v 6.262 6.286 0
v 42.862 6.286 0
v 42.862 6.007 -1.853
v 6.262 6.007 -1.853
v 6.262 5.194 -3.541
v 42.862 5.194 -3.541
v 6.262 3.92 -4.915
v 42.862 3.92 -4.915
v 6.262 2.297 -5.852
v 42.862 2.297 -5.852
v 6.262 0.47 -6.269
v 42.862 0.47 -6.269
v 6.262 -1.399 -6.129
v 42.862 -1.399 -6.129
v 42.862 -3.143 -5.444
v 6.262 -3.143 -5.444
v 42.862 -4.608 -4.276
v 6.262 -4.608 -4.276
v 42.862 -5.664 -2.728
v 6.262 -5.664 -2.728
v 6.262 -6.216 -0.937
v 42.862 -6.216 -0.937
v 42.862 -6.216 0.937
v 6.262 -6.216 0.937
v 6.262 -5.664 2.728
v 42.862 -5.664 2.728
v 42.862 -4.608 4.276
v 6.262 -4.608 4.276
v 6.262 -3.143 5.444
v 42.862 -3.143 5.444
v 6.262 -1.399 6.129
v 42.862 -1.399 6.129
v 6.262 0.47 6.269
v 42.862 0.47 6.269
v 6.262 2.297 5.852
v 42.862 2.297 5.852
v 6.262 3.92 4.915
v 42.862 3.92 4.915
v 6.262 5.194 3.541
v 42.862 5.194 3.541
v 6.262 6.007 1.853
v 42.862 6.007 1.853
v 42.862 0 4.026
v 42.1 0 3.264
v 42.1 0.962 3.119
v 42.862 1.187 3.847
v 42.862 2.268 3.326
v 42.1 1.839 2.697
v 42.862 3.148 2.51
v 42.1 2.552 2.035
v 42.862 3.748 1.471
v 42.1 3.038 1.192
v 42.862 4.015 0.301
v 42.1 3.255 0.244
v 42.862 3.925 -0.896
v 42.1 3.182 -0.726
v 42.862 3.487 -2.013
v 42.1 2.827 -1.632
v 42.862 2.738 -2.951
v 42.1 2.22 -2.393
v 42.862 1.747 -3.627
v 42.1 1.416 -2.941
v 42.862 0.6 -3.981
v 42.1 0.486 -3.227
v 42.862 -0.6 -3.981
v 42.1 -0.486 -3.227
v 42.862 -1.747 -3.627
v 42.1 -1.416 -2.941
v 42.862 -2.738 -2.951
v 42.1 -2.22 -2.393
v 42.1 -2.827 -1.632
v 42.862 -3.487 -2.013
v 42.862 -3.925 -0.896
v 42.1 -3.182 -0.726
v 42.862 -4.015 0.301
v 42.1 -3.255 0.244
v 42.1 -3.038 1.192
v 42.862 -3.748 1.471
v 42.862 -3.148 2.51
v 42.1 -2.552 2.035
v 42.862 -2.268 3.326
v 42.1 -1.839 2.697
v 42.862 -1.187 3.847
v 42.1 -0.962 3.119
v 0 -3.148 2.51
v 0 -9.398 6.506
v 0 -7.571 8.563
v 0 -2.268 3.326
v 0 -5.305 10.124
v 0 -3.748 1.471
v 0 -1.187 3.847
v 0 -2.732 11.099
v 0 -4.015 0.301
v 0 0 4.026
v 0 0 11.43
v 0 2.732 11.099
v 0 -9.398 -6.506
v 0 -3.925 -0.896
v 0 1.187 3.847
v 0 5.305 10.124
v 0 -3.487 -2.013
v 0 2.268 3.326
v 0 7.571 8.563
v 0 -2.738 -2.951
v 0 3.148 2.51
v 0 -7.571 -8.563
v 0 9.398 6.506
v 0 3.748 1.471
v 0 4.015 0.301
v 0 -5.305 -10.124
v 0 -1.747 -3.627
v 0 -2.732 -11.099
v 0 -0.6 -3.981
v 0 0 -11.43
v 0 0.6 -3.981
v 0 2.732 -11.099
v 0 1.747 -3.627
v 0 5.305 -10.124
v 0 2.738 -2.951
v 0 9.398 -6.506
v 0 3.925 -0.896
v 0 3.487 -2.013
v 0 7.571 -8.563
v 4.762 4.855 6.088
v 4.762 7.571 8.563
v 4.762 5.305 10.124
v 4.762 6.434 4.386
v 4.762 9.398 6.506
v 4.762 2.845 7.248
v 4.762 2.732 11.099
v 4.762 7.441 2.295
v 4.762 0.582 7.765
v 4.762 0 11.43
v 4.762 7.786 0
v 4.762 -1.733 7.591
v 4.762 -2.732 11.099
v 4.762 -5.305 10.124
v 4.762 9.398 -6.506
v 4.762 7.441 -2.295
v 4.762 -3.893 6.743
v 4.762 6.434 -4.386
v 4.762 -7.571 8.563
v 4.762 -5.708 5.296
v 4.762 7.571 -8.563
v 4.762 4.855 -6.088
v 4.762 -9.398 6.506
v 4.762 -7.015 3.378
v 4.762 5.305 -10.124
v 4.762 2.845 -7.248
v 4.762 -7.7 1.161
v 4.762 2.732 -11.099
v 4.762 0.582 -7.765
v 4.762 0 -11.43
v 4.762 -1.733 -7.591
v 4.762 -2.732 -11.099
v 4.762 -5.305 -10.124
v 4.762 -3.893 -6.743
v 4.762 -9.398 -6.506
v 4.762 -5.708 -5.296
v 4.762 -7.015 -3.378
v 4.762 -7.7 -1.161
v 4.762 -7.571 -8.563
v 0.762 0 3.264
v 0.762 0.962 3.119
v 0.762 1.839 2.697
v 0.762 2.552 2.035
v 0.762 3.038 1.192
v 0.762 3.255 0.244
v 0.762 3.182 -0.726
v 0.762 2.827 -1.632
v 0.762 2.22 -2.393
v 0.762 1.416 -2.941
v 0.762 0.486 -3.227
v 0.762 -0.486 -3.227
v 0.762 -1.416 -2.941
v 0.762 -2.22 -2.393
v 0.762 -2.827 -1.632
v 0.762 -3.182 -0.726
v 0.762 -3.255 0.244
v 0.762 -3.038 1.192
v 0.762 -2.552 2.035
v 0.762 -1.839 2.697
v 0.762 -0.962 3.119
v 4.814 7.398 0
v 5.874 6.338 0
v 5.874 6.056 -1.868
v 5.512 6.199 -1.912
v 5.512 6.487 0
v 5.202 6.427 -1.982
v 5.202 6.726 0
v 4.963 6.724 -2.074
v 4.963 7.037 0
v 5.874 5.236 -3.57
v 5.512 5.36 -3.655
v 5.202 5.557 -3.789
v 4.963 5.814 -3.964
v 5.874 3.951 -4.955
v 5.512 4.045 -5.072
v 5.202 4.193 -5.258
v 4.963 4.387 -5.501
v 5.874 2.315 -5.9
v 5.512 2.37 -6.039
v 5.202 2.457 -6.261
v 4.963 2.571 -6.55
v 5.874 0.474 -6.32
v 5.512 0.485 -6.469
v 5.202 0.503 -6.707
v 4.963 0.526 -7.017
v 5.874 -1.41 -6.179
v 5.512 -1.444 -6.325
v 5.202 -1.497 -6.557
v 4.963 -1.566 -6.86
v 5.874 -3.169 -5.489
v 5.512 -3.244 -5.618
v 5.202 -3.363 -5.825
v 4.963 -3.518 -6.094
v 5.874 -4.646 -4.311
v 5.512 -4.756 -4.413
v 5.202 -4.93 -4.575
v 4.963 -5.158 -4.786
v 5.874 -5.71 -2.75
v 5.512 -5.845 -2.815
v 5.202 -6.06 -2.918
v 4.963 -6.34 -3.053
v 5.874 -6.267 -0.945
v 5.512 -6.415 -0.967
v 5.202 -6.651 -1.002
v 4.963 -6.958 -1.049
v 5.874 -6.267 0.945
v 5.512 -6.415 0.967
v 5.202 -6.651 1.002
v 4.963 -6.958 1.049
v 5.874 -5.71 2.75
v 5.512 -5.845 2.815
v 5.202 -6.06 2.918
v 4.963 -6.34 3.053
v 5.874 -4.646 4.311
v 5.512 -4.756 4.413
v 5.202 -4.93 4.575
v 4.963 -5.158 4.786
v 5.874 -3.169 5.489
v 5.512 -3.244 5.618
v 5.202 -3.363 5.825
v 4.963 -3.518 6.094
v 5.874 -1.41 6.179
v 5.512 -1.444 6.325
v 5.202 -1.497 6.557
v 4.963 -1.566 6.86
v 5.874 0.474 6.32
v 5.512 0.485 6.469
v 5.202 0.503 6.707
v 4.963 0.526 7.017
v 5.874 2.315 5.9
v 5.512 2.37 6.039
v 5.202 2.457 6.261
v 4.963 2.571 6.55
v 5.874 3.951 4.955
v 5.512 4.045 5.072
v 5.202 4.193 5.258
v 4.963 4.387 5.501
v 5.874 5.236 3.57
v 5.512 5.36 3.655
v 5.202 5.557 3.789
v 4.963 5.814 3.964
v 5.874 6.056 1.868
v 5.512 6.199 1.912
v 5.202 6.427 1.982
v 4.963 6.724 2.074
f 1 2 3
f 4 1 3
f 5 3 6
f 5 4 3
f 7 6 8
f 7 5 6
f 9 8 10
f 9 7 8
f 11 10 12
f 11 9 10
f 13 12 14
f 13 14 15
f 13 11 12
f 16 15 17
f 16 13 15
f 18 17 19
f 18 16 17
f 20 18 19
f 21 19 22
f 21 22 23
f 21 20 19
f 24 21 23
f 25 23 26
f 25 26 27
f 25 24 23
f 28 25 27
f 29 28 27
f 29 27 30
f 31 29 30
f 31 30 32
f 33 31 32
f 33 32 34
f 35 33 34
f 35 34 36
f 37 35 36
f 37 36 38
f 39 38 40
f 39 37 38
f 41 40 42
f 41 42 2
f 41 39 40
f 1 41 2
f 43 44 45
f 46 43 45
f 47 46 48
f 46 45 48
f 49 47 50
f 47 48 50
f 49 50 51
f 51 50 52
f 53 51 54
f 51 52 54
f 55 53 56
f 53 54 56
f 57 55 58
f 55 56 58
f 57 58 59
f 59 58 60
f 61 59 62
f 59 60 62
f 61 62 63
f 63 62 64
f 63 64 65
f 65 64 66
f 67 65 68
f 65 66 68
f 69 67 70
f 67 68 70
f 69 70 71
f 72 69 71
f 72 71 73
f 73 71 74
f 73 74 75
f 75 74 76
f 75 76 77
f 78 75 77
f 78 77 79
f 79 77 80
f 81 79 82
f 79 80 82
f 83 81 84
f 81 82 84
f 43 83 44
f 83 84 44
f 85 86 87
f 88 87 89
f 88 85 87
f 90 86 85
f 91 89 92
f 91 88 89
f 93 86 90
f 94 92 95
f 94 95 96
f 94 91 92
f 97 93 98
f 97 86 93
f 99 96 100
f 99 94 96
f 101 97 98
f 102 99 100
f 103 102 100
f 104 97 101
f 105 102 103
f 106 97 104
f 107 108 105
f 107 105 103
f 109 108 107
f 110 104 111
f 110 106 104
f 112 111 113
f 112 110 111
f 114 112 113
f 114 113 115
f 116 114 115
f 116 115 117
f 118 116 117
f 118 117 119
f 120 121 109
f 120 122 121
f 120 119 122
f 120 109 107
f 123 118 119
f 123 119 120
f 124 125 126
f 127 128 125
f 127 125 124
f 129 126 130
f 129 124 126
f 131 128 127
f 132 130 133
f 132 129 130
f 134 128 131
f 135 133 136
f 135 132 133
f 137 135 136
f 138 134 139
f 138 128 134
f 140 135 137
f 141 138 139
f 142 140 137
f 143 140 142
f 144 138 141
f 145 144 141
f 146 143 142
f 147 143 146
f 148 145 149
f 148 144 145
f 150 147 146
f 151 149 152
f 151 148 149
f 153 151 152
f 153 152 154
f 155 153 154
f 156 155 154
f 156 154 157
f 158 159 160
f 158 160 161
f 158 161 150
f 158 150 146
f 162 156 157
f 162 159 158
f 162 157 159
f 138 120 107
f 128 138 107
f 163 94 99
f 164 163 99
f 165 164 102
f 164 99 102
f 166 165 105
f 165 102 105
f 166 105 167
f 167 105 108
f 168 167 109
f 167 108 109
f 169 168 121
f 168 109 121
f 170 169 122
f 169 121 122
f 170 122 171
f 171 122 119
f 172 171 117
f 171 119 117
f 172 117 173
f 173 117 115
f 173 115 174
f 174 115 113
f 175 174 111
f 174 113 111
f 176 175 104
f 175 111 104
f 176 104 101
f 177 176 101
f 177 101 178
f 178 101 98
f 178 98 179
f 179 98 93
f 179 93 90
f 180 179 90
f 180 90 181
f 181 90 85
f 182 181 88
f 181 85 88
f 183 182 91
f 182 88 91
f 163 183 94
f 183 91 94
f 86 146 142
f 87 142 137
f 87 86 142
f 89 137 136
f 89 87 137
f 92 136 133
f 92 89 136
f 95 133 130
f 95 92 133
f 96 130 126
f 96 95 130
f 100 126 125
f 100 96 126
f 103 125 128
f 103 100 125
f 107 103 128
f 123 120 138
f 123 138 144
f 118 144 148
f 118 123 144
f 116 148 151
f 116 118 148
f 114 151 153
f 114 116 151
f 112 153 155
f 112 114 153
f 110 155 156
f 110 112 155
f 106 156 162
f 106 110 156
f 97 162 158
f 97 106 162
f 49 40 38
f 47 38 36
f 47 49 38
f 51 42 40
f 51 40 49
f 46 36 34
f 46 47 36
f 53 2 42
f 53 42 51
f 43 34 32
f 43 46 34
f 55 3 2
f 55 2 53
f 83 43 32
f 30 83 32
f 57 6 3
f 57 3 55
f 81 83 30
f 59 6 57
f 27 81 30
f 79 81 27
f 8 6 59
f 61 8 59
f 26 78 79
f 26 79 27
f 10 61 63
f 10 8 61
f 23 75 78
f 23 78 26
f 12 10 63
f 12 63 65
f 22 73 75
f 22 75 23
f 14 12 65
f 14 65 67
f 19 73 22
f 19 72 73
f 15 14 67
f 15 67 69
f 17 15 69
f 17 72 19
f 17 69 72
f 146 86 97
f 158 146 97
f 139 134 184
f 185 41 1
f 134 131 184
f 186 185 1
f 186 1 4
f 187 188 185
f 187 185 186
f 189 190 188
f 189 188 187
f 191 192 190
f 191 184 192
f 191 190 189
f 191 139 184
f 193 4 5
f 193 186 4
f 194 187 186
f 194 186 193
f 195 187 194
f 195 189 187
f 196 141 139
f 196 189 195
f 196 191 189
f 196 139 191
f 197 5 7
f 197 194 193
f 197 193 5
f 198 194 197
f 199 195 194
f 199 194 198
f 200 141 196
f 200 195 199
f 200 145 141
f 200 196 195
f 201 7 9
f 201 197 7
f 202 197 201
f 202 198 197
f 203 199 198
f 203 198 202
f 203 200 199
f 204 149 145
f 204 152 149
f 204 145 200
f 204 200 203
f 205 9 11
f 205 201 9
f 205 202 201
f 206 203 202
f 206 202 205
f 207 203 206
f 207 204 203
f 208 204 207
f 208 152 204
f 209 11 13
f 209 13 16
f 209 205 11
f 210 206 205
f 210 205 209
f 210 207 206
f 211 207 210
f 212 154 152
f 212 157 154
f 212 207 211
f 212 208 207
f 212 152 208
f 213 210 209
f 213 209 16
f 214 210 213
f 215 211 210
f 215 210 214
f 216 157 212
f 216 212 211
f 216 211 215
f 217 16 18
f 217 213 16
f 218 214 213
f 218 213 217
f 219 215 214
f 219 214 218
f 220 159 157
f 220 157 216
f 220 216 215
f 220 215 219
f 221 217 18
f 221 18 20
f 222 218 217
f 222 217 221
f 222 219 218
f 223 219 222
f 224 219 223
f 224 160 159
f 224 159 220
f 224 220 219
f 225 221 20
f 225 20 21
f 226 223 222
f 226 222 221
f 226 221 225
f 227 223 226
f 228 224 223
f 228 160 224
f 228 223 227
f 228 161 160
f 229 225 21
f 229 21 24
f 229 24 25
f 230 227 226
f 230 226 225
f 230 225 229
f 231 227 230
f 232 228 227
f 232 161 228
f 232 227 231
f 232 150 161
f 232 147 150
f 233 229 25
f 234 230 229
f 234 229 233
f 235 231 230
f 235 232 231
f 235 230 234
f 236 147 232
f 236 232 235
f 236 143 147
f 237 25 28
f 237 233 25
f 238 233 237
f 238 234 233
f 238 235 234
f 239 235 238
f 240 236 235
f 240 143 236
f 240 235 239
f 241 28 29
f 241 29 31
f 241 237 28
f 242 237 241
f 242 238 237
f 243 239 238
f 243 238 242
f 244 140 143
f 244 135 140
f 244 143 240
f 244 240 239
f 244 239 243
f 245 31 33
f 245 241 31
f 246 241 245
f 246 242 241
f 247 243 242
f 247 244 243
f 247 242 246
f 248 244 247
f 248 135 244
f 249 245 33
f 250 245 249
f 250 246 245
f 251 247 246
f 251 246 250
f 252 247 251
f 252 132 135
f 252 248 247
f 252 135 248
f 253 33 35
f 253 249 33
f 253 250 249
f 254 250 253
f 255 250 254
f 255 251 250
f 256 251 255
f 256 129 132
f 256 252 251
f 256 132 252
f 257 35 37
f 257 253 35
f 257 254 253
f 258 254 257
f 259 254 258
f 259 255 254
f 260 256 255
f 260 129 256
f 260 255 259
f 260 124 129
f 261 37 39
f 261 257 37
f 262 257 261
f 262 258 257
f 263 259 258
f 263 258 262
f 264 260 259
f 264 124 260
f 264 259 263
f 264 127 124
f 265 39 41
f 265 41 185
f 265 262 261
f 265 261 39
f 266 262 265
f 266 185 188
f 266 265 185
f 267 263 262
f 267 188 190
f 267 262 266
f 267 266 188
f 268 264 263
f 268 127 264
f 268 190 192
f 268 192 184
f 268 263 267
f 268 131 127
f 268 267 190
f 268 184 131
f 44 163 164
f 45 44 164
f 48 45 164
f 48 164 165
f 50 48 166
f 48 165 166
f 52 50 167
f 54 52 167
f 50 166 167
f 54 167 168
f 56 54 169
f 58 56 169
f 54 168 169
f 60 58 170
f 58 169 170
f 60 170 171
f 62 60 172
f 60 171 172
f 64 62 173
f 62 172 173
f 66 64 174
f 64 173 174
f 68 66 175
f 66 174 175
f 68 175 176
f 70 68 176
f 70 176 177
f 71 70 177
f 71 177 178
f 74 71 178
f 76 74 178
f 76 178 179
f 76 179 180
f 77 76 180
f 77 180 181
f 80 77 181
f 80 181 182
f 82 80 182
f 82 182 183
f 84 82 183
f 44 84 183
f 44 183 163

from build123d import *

# Parameters (mm, degrees)
FILLET1_R             = 1.5
HOLE_WIZARD_5_16_18_D = 6.5278
CUT_EXTRUDE1_DEPTH    = 43.8625
CHAMFER1_SIZE         = 0.762


with BuildPart() as part:
    # Sketch1 → Revolve1 (revolve)
    with BuildSketch(Plane.XY):
        Polygon((0, 0), (42.8625, 0), (42.8625, 6.2865), (4.7625, 6.2865), (4.7625, 11.43), (0, 11.43), align=None)
    revolve(axis=Axis((0, 0, 0), (-1, 0, 0)))

    # Fillet1
    fillet1_edges = [part.edges().sort_by_distance(p)[0] for p in [
        (4.7625, -6.2865, 0),
    ]]
    fillet(fillet1_edges, radius=FILLET1_R)

    # 5/16-18 (through all)
    with Locations(Plane(origin=(42.8625, 0, 0), x_dir=(0, 0, -1), z_dir=(1, 0, 0))):
        with Locations((0, 0)):
            Hole(HOLE_WIZARD_5_16_18_D / 2)

    # Sketch4 → Cut-Extrude1 (cut, through all)
    with BuildSketch(Plane.ZY):
        with BuildLine():
            Line((-6.505574225, 9.398), (6.505574225, 9.398))
            ThreePointArc((6.505574225, 9.398), (0, 11.43), (-6.505574225, 9.398))
        make_face()
        with BuildLine():
            Line((6.505574225, -9.398), (-6.505574225, -9.398))
            ThreePointArc((-6.505574225, -9.398), (0, -11.43), (6.505574225, -9.398))
        make_face()
    extrude(amount=-CUT_EXTRUDE1_DEPTH, mode=Mode.SUBTRACT)

    # Chamfer1
    chamfer1_edges = [part.edges().sort_by_distance(p)[0] for p in [
        (42.8625, 0, -3.2639),
        (0, 0, -3.2639),
    ]]
    chamfer(chamfer1_edges, length=CHAMFER1_SIZE)


solid = part.part
